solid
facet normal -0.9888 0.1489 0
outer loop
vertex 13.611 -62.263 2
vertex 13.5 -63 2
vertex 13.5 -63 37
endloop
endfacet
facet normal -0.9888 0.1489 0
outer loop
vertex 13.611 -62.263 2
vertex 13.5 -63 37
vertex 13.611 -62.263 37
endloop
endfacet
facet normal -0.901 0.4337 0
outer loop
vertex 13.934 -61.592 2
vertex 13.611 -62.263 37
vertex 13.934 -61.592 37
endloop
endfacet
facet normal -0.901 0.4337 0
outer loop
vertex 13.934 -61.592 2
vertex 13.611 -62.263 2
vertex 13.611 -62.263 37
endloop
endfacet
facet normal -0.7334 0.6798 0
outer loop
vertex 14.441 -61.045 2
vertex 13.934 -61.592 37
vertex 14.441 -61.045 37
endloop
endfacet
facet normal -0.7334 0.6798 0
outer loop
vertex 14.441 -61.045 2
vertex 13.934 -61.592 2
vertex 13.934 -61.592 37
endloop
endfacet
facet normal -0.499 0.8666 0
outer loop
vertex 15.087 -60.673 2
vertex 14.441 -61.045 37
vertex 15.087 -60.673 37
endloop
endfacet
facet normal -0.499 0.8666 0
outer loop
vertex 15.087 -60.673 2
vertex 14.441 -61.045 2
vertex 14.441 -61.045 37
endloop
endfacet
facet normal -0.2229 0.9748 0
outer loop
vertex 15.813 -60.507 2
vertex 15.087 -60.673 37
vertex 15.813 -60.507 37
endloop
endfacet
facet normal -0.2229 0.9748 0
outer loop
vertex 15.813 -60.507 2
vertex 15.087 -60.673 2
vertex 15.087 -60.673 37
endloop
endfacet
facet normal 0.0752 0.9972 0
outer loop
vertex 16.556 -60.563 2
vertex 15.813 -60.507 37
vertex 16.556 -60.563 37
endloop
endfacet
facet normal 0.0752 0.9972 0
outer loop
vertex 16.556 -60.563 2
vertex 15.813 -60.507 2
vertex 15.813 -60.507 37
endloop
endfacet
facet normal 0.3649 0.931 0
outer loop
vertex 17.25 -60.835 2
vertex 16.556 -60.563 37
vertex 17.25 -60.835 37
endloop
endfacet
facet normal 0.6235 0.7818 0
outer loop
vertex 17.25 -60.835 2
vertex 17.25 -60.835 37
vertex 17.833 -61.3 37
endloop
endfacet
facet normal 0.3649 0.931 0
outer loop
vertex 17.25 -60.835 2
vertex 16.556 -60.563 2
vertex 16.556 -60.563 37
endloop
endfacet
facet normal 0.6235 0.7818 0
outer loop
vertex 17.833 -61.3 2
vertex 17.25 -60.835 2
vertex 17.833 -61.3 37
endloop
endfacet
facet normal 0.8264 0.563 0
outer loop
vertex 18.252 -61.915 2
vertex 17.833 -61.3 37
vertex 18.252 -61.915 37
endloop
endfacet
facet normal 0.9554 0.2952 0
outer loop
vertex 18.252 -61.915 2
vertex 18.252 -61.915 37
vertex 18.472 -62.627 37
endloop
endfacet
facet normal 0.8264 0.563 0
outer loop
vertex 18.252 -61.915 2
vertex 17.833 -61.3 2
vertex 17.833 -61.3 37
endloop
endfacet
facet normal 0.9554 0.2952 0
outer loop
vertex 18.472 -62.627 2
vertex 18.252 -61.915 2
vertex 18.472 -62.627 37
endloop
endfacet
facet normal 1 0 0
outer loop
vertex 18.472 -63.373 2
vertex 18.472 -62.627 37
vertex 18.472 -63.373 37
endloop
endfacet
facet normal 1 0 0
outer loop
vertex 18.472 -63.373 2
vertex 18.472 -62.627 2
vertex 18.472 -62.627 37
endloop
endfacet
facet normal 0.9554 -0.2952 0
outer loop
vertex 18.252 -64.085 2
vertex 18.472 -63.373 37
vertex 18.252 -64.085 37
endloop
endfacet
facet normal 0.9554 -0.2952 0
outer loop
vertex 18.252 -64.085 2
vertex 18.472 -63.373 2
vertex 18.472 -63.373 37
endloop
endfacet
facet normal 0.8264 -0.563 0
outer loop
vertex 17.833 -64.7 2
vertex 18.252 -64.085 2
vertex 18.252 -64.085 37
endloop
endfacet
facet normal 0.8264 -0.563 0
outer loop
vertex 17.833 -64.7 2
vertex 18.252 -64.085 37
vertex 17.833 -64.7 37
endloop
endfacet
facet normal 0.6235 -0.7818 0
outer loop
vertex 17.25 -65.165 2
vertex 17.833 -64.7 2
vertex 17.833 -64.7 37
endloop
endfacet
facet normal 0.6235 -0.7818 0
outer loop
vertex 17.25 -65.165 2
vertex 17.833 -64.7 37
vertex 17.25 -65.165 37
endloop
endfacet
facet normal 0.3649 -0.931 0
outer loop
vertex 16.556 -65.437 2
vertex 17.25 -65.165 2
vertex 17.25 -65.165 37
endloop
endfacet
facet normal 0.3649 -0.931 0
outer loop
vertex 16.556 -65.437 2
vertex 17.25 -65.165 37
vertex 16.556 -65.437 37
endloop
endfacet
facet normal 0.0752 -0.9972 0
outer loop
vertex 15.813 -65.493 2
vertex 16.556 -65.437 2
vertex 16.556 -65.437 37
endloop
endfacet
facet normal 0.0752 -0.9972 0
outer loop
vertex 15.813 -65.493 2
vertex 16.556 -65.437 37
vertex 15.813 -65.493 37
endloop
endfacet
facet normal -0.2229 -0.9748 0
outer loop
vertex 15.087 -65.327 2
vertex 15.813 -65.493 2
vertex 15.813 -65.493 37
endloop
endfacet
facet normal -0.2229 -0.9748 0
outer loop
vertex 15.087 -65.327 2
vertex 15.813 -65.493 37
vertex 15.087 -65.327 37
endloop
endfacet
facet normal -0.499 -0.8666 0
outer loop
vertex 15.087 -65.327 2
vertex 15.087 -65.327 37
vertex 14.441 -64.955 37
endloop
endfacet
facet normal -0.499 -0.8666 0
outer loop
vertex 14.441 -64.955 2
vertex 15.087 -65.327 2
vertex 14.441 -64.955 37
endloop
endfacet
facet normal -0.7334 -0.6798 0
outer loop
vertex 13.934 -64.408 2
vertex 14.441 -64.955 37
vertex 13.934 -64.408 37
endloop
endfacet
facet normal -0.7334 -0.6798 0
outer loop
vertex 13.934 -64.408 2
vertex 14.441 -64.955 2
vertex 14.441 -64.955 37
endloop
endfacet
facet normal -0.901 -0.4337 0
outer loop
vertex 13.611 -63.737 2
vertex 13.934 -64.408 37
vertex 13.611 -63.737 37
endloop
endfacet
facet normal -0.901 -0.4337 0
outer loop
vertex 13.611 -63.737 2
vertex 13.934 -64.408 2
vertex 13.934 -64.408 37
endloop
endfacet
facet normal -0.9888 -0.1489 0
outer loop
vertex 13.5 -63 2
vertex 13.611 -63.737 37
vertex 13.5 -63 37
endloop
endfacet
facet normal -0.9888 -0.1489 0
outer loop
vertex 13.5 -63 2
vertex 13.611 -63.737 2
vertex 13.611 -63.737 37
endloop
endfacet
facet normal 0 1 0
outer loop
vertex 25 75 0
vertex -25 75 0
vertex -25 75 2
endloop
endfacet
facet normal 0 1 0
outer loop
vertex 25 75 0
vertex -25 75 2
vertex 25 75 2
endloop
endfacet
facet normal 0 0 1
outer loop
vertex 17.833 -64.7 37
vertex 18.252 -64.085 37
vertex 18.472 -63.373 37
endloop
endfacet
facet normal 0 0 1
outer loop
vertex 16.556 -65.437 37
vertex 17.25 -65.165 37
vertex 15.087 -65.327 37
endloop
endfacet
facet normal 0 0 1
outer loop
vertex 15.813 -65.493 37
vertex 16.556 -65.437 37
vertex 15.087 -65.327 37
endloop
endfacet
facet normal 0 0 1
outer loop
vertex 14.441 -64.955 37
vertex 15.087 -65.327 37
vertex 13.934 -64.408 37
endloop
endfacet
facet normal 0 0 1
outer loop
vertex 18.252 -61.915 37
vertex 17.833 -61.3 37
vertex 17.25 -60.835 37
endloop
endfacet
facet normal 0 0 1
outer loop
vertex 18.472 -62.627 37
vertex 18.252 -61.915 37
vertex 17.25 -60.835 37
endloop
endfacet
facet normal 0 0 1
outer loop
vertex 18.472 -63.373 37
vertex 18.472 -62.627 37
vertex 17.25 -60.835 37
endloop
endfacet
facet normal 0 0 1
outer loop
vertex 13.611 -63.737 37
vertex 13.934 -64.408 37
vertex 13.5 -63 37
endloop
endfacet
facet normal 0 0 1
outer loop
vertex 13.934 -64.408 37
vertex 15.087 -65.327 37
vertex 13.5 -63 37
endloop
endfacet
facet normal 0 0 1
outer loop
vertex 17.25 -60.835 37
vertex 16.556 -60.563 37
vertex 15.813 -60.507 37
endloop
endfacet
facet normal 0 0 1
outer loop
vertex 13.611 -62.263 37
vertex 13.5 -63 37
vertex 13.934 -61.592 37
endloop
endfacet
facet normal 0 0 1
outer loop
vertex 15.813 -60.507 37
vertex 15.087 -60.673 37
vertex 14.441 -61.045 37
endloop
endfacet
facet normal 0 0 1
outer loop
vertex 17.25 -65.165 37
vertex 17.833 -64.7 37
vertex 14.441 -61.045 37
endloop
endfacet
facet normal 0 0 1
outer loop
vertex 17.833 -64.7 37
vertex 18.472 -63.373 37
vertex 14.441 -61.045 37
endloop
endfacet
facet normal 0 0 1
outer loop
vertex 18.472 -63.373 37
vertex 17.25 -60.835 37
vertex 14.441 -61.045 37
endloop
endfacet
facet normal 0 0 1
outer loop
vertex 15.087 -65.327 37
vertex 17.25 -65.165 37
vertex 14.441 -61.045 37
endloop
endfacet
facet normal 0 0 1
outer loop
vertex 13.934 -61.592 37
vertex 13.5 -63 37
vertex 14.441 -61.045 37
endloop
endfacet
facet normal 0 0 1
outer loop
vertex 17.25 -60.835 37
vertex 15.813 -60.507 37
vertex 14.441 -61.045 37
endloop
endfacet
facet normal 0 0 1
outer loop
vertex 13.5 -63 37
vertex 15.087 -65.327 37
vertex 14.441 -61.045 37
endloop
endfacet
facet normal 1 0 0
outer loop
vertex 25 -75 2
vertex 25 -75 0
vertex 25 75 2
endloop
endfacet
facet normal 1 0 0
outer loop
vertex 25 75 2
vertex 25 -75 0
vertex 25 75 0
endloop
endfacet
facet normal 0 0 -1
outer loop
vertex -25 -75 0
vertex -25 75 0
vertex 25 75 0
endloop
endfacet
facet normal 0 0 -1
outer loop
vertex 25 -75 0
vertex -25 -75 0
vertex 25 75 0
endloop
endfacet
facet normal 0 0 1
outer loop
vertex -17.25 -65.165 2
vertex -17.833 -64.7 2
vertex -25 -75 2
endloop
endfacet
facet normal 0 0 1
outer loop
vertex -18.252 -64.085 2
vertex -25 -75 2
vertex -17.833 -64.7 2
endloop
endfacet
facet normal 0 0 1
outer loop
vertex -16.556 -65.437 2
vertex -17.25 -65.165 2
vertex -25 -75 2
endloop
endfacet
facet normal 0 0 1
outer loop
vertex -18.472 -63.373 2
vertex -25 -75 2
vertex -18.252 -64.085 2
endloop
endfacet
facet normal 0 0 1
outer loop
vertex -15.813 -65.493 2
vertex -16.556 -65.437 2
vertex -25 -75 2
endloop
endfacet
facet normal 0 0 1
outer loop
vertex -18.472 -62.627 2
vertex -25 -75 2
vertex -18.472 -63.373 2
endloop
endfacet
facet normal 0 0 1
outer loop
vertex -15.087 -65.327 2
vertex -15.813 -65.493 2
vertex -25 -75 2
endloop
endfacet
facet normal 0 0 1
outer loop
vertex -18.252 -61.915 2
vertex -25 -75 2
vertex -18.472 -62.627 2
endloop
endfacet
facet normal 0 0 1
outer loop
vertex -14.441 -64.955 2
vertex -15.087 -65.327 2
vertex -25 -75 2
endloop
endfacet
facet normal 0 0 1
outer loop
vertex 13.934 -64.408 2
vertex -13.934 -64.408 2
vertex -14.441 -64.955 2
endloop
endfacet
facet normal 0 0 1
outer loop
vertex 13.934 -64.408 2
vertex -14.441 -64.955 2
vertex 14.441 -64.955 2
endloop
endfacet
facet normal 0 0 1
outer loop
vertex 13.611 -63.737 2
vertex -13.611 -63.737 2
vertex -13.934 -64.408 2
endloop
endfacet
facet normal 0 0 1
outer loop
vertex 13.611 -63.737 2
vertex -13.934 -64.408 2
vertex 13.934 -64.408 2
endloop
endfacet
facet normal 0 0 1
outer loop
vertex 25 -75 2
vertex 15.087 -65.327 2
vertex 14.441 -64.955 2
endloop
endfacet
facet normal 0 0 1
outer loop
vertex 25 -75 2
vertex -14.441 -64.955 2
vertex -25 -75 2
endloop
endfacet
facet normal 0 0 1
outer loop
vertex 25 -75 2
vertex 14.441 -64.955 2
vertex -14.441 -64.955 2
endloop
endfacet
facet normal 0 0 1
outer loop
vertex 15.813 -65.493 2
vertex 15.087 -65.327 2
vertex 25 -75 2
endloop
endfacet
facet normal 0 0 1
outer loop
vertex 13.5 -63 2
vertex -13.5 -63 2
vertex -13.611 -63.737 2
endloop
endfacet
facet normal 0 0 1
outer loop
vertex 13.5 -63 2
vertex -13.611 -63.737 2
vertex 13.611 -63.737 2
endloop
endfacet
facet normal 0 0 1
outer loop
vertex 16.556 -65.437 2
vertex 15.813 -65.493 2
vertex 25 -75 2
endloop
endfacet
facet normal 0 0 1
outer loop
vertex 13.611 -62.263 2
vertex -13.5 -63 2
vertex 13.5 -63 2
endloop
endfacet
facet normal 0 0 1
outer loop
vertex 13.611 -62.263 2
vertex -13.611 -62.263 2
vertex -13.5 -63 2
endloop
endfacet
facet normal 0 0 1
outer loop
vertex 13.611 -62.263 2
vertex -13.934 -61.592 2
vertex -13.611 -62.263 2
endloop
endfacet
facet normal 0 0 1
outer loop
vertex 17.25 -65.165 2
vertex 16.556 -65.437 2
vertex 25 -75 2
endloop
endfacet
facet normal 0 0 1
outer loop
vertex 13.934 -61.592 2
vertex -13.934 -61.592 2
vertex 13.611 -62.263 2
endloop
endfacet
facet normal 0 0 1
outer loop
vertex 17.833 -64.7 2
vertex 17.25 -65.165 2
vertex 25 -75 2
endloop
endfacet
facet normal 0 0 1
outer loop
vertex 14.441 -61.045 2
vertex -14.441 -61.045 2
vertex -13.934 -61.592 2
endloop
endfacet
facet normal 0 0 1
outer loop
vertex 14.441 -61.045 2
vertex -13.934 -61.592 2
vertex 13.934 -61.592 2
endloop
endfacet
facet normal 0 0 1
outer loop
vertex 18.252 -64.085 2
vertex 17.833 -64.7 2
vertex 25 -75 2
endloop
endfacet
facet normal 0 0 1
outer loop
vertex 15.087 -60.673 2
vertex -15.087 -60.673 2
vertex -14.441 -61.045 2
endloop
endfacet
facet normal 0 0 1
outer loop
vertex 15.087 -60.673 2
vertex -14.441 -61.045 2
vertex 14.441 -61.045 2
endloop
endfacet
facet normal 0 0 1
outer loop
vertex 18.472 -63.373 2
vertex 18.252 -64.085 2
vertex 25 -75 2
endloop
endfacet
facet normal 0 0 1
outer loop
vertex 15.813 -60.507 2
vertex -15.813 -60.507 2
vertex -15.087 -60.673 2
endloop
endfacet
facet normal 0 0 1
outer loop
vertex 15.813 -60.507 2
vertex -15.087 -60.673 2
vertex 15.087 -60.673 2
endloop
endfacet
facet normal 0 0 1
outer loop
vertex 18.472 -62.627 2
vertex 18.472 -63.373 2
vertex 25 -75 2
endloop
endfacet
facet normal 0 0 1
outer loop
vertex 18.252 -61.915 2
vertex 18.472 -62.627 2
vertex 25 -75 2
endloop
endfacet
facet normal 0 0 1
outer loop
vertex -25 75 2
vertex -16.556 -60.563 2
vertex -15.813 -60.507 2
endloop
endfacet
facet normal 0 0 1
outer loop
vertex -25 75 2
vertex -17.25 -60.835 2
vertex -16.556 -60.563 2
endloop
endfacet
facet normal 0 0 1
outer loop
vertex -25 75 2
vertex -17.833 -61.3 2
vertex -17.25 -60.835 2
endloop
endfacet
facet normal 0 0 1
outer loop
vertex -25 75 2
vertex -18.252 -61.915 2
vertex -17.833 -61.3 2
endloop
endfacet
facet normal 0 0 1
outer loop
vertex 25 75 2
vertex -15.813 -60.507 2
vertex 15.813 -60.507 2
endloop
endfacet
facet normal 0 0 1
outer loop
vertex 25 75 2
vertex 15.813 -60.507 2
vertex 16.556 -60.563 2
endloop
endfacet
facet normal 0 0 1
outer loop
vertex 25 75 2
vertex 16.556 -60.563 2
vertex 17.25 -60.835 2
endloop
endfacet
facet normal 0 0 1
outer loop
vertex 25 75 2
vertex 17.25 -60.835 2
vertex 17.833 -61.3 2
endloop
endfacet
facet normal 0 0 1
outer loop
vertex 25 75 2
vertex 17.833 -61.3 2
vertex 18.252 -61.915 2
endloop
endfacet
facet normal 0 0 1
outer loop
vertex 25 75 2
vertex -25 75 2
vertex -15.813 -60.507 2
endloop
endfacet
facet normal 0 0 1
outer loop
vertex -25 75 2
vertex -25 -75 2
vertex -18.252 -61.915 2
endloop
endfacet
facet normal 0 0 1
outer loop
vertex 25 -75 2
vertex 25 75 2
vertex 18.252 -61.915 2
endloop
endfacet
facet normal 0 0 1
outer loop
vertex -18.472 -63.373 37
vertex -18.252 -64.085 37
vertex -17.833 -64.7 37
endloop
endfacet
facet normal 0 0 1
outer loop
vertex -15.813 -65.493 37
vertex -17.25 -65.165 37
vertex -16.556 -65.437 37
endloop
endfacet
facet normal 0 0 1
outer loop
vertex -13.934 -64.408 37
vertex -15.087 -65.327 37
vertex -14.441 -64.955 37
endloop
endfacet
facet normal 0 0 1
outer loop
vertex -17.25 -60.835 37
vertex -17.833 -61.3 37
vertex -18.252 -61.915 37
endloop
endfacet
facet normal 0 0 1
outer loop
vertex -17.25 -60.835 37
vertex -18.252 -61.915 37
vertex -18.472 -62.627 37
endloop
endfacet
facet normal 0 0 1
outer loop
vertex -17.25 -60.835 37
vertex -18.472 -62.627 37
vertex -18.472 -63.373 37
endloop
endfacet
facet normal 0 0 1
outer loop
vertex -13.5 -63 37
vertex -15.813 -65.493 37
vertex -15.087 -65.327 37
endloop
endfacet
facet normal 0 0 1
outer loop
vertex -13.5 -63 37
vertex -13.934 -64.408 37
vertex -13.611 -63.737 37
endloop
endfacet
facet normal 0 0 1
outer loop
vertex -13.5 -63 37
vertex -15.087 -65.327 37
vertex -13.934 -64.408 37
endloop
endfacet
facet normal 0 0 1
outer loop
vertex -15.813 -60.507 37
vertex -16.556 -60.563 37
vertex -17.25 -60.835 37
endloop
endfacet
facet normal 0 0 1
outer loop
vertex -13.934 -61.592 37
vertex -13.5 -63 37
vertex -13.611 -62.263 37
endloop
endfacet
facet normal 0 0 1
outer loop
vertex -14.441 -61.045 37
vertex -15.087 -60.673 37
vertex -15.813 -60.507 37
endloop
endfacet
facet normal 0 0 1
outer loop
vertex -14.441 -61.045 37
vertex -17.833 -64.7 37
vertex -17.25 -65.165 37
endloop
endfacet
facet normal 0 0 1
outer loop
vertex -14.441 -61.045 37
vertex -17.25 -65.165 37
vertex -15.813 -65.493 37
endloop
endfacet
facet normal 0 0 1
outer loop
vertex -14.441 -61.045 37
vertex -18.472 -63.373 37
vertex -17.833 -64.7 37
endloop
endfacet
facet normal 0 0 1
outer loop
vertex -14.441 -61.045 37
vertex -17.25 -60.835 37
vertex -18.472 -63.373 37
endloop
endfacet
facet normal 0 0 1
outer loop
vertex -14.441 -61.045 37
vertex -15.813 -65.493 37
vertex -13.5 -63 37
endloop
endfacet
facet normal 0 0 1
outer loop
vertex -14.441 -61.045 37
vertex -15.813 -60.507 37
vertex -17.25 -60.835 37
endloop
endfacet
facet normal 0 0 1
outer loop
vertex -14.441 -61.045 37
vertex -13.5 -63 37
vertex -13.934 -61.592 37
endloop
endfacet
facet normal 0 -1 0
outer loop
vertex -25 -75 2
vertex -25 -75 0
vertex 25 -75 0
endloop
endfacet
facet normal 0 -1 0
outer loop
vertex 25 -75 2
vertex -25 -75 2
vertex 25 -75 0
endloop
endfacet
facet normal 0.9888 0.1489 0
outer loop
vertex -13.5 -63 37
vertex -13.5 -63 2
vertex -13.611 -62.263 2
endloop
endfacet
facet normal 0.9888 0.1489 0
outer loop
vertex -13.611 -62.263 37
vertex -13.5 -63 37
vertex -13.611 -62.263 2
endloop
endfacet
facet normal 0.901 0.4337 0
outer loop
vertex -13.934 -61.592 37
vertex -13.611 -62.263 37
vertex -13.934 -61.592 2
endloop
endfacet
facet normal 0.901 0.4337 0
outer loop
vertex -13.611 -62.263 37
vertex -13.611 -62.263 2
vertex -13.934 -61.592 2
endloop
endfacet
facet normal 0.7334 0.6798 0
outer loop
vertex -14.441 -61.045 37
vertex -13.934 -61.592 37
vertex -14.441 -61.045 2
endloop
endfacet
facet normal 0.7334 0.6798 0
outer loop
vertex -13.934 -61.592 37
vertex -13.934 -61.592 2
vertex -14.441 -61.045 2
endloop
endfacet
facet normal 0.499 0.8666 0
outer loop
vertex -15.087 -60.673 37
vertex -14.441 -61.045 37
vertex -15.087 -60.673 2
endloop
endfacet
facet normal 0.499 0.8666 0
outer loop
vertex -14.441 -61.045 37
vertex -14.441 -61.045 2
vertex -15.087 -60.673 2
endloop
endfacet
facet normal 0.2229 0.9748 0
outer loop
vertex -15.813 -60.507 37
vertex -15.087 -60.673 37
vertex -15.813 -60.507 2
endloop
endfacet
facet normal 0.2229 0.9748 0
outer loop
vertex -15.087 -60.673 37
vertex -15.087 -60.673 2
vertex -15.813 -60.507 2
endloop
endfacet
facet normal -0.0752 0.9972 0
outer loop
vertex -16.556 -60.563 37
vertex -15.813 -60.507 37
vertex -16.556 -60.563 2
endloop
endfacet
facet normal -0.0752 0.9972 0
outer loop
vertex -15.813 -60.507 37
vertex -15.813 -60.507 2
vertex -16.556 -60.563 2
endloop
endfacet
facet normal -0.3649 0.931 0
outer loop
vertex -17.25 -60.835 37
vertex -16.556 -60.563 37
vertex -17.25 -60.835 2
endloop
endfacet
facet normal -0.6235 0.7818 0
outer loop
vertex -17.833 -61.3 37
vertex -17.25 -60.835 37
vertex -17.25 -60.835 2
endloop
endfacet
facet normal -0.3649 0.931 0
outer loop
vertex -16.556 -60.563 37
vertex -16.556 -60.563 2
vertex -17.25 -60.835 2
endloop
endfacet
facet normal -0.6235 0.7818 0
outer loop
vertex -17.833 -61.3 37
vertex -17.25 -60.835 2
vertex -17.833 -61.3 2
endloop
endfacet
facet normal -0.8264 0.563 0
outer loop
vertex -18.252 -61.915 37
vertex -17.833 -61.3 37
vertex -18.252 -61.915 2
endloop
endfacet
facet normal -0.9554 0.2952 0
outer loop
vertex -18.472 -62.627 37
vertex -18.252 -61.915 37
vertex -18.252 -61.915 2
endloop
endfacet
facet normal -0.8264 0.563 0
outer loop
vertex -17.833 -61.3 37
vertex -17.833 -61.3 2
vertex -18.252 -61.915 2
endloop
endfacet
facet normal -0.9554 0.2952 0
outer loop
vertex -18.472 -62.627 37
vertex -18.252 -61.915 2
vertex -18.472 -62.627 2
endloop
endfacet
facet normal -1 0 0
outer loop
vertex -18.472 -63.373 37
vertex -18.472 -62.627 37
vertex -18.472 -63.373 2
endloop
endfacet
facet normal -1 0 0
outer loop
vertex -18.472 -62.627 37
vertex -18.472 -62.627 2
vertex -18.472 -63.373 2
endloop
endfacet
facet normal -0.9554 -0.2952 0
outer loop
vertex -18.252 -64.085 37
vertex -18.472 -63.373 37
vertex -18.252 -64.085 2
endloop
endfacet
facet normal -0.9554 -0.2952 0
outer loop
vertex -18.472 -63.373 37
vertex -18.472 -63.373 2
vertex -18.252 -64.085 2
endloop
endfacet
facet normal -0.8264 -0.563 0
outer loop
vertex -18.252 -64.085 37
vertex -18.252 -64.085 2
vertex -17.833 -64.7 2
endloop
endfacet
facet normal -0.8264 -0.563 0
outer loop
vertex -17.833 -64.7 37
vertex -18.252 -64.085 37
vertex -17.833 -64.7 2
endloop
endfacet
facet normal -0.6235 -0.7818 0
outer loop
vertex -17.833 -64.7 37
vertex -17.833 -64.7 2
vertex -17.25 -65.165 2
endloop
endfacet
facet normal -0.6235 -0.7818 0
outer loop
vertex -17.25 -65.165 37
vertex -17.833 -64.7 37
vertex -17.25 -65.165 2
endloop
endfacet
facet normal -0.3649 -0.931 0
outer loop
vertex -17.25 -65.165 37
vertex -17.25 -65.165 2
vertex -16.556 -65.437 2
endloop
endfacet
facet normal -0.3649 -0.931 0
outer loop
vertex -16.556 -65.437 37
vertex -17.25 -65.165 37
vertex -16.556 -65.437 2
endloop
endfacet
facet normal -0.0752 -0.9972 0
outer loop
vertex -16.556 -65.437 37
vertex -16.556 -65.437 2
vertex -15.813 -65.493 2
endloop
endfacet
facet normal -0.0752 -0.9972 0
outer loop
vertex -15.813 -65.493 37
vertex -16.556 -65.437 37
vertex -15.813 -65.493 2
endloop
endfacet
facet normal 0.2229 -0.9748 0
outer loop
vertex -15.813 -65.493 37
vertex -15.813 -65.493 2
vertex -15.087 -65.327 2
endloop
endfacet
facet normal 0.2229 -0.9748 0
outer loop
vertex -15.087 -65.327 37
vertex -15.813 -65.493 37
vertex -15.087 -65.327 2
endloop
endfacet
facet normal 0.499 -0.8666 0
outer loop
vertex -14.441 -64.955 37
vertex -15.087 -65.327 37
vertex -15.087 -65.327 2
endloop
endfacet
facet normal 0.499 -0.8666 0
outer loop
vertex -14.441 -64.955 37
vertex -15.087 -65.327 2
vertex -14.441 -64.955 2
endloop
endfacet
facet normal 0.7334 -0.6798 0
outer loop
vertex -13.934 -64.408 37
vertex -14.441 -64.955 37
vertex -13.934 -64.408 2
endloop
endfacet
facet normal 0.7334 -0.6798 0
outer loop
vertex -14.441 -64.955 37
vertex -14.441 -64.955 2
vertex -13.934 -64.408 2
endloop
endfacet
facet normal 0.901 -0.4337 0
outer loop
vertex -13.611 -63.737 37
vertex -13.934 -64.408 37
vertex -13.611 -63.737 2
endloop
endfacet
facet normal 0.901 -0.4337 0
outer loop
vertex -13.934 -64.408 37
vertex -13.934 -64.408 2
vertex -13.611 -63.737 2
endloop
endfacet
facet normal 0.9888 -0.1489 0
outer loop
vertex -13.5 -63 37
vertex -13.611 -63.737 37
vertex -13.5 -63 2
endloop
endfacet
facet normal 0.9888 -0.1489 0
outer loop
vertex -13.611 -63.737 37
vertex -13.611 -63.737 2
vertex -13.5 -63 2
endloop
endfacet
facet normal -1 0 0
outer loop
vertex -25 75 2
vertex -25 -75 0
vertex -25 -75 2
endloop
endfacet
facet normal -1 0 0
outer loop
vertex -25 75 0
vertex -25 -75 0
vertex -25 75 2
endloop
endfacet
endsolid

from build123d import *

# Parameters (mm, degrees)
F0_W     = 50
F0_H     = 150
F1_DEPTH = 2
F2_R     = 2.5
F3_DEPTH = 35


# Not quite as in the source:
# - a pattern or mirror of a feature is missing from the dataset's text; its kind, count and spacing are read off the source's solid


with BuildPart() as f1:
    # F0 (on Top) → F1 (new body)
    with BuildSketch(Plane.XY):
        Rectangle(F0_W, F0_H)
    extrude(amount=F1_DEPTH)

    # F2 (on face) → F3 (join)
    with BuildSketch(Plane.XY.offset(2)):
        with Locations((-16, -63)):
            Circle(F2_R)
    f3 = extrude(amount=F3_DEPTH)

    # F3_copies: F3 across plane
    add(f3.mirror(Plane(origin=(0, 0, 0), x_dir=(0, 0, 1), z_dir=(1, 0, 0))))


solid = f1.part
